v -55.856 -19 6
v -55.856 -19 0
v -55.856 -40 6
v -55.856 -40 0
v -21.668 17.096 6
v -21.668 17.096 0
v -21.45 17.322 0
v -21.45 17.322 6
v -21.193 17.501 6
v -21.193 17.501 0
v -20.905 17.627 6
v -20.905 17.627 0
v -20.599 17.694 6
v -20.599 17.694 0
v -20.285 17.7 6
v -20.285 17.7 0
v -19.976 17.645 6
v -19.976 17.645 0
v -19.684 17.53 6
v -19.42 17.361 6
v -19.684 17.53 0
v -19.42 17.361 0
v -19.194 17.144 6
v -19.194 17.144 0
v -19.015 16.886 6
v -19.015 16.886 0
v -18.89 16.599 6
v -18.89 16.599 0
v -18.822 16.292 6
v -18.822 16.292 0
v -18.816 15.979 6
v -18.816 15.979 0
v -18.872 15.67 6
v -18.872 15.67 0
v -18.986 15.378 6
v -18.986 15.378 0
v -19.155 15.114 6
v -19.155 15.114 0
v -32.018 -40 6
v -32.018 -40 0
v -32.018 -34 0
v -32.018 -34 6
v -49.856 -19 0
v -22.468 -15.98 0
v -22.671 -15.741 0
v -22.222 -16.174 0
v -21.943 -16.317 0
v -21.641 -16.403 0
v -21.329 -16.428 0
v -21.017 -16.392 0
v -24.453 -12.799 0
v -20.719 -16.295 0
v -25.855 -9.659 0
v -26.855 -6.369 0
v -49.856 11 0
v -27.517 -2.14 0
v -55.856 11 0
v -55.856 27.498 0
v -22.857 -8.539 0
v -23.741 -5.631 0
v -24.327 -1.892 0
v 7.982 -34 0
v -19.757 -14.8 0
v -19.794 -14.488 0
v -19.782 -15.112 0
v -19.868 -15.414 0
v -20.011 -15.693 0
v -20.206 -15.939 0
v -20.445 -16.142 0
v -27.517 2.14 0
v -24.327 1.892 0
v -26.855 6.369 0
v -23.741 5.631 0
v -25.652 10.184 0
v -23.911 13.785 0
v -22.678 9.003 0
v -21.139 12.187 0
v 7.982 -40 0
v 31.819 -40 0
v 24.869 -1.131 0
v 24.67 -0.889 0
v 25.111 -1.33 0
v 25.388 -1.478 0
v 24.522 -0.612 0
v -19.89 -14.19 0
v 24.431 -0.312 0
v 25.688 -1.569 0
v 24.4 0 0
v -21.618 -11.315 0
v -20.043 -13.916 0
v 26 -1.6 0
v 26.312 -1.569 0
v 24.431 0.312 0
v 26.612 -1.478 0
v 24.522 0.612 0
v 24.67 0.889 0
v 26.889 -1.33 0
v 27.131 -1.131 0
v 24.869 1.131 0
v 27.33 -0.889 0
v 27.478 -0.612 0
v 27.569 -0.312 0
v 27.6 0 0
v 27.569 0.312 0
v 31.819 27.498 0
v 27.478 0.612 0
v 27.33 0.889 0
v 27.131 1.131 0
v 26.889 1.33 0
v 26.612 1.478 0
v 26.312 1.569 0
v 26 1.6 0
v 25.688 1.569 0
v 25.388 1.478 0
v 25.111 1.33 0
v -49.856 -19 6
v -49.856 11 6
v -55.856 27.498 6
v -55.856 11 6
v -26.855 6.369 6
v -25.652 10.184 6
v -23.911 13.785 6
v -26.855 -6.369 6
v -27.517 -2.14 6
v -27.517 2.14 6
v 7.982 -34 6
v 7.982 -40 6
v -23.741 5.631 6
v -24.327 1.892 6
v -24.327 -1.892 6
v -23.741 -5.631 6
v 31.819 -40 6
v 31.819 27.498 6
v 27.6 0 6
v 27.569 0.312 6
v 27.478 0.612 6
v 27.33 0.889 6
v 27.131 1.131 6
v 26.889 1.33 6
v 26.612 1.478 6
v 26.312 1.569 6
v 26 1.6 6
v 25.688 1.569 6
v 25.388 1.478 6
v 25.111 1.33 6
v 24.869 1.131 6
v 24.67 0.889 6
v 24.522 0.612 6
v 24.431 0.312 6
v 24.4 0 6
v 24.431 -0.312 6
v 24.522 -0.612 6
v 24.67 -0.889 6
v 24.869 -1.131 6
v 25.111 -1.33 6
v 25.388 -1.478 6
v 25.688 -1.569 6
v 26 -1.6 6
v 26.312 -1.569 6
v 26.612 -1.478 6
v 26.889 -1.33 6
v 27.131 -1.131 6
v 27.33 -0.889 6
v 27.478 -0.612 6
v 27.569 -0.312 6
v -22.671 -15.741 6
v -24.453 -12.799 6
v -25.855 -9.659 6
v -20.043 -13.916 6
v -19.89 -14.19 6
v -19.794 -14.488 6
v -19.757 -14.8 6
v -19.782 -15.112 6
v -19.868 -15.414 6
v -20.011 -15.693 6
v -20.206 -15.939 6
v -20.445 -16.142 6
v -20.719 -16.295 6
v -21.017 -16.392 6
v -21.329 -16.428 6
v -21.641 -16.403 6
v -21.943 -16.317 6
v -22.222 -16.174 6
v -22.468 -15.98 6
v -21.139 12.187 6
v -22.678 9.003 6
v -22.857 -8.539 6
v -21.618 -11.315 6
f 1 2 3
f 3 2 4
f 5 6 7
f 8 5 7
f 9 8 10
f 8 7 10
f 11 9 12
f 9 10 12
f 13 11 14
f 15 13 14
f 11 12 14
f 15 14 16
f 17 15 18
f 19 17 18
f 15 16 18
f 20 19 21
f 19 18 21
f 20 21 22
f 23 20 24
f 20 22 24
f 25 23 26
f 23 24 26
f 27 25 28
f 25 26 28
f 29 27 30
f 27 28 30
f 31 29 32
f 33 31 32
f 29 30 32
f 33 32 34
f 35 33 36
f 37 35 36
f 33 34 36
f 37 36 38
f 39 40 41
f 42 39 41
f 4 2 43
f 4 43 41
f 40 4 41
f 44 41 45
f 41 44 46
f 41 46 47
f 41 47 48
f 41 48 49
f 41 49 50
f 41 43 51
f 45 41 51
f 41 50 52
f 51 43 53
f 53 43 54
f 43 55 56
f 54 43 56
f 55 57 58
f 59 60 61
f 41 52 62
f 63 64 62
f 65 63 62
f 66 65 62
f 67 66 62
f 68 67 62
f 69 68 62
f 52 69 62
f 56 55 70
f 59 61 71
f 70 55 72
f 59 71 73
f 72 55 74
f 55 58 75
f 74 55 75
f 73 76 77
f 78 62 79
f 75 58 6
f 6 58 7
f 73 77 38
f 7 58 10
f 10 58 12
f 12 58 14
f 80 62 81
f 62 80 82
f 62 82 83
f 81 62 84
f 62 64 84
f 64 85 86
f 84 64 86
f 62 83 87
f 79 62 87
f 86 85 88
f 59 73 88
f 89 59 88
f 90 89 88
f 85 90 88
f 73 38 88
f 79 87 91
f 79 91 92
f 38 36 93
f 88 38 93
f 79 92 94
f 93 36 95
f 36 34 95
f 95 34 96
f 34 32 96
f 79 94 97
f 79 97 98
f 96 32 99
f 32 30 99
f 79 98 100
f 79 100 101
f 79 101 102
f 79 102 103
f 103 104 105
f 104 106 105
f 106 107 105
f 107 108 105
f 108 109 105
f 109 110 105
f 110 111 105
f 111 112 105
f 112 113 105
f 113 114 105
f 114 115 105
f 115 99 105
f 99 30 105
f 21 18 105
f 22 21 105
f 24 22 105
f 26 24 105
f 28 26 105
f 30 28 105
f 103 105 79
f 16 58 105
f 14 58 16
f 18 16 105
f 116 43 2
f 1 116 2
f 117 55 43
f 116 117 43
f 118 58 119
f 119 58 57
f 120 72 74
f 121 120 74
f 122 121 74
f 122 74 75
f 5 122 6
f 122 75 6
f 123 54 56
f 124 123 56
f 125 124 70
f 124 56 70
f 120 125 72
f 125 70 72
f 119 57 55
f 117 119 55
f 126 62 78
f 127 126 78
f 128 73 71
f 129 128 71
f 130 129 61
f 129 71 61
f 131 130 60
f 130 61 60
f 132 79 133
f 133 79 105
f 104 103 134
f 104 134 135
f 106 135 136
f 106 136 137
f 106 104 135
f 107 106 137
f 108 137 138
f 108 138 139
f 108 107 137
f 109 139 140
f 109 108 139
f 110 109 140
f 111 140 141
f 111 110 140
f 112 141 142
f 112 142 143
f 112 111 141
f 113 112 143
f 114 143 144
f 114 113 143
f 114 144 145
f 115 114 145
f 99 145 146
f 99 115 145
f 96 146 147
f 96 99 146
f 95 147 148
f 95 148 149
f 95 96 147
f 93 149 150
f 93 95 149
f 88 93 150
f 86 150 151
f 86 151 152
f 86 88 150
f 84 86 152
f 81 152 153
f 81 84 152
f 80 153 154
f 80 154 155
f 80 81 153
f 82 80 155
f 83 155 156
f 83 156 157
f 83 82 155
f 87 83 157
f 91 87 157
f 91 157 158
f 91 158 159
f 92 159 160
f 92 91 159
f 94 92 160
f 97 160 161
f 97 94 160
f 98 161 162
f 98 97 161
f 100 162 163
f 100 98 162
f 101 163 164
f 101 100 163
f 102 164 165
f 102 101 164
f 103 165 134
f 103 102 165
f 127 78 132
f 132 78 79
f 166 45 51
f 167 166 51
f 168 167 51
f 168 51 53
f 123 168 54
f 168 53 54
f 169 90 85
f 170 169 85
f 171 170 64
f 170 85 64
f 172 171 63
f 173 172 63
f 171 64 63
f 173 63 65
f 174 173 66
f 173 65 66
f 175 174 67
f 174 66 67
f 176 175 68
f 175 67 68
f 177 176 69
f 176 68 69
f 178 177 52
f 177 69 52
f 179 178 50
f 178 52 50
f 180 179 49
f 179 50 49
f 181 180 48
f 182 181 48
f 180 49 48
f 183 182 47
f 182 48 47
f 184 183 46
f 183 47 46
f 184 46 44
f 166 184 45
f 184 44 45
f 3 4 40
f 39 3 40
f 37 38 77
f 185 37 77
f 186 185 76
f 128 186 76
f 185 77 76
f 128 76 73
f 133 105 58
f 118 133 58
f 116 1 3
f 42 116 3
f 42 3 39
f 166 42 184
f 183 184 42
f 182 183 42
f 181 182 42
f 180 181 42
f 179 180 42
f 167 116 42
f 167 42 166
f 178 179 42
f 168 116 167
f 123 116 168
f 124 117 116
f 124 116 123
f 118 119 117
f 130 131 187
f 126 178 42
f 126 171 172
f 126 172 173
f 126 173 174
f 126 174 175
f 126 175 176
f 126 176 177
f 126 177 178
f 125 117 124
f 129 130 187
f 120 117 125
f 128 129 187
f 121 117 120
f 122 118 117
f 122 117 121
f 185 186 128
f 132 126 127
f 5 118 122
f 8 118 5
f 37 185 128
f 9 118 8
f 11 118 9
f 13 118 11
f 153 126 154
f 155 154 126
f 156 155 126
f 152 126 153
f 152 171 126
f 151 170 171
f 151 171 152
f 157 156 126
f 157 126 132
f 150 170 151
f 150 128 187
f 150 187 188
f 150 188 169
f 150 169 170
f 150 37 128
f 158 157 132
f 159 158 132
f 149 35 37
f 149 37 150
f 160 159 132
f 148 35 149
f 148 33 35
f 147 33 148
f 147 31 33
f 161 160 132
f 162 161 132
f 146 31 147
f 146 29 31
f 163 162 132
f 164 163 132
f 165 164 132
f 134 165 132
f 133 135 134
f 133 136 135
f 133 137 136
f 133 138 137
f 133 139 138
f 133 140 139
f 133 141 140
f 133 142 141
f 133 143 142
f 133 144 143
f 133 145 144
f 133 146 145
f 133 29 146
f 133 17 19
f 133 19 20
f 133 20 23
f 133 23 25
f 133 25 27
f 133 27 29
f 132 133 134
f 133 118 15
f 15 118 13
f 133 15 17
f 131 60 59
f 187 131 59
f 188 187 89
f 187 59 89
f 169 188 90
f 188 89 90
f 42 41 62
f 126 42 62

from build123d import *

# Parameters (mm, degrees)
SKETCH1_R           = 1.6
BOSS_EXTRUDE1_DEPTH = 6


with BuildPart() as part:
    # Sketch1 → Boss-Extrude1 (new body)
    with BuildSketch(Plane.XY):
        Polygon((-55.855858156, -19), (-55.855858156, -40), (-32.018263016, -40), (-32.018263016, -34), (7.981736984, -34), (7.981736984, -40), (31.819332123, -40), (31.819332123, 27.498322337), (-55.855858156, 27.498322337), (-55.855858156, 11), (-49.855858156, 11), (-49.855858156, -19), align=None)
        with BuildLine():
            ThreePointArc((-26.8550349, -6.369230763), (-27.6, 2.9e-08), (-26.855034887, 6.369230819))
            ThreePointArc((-26.855034887, 6.369230819), (-24.84706156, 12.015969866), (-21.667528577, 17.096145922))
            ThreePointArc((-21.667528577, 17.096145922), (-19.420359041, 17.361153612), (-19.15535135, 15.113984076))
            ThreePointArc((-19.15535135, 15.113984076), (-21.966242856, 10.622813883), (-23.741407682, 5.630769153))
            ThreePointArc((-23.741407682, 5.630769153), (-24.4, 3e-09), (-23.741407684, -5.630769147))
            ThreePointArc((-23.741407684, -5.630769147), (-22.28057337, -9.946660258), (-20.042787404, -13.9156988))
            ThreePointArc((-20.042787404, -13.9156988), (-20.444563705, -16.142484781), (-22.671349686, -15.740708479))
            ThreePointArc((-22.671349686, -15.740708479), (-25.202615761, -11.251140334), (-26.8550349, -6.369230763))
        make_face(mode=Mode.SUBTRACT)
        with Locations((26, 0)):
            Circle(SKETCH1_R, mode=Mode.SUBTRACT)
    extrude(amount=BOSS_EXTRUDE1_DEPTH)


solid = part.part
